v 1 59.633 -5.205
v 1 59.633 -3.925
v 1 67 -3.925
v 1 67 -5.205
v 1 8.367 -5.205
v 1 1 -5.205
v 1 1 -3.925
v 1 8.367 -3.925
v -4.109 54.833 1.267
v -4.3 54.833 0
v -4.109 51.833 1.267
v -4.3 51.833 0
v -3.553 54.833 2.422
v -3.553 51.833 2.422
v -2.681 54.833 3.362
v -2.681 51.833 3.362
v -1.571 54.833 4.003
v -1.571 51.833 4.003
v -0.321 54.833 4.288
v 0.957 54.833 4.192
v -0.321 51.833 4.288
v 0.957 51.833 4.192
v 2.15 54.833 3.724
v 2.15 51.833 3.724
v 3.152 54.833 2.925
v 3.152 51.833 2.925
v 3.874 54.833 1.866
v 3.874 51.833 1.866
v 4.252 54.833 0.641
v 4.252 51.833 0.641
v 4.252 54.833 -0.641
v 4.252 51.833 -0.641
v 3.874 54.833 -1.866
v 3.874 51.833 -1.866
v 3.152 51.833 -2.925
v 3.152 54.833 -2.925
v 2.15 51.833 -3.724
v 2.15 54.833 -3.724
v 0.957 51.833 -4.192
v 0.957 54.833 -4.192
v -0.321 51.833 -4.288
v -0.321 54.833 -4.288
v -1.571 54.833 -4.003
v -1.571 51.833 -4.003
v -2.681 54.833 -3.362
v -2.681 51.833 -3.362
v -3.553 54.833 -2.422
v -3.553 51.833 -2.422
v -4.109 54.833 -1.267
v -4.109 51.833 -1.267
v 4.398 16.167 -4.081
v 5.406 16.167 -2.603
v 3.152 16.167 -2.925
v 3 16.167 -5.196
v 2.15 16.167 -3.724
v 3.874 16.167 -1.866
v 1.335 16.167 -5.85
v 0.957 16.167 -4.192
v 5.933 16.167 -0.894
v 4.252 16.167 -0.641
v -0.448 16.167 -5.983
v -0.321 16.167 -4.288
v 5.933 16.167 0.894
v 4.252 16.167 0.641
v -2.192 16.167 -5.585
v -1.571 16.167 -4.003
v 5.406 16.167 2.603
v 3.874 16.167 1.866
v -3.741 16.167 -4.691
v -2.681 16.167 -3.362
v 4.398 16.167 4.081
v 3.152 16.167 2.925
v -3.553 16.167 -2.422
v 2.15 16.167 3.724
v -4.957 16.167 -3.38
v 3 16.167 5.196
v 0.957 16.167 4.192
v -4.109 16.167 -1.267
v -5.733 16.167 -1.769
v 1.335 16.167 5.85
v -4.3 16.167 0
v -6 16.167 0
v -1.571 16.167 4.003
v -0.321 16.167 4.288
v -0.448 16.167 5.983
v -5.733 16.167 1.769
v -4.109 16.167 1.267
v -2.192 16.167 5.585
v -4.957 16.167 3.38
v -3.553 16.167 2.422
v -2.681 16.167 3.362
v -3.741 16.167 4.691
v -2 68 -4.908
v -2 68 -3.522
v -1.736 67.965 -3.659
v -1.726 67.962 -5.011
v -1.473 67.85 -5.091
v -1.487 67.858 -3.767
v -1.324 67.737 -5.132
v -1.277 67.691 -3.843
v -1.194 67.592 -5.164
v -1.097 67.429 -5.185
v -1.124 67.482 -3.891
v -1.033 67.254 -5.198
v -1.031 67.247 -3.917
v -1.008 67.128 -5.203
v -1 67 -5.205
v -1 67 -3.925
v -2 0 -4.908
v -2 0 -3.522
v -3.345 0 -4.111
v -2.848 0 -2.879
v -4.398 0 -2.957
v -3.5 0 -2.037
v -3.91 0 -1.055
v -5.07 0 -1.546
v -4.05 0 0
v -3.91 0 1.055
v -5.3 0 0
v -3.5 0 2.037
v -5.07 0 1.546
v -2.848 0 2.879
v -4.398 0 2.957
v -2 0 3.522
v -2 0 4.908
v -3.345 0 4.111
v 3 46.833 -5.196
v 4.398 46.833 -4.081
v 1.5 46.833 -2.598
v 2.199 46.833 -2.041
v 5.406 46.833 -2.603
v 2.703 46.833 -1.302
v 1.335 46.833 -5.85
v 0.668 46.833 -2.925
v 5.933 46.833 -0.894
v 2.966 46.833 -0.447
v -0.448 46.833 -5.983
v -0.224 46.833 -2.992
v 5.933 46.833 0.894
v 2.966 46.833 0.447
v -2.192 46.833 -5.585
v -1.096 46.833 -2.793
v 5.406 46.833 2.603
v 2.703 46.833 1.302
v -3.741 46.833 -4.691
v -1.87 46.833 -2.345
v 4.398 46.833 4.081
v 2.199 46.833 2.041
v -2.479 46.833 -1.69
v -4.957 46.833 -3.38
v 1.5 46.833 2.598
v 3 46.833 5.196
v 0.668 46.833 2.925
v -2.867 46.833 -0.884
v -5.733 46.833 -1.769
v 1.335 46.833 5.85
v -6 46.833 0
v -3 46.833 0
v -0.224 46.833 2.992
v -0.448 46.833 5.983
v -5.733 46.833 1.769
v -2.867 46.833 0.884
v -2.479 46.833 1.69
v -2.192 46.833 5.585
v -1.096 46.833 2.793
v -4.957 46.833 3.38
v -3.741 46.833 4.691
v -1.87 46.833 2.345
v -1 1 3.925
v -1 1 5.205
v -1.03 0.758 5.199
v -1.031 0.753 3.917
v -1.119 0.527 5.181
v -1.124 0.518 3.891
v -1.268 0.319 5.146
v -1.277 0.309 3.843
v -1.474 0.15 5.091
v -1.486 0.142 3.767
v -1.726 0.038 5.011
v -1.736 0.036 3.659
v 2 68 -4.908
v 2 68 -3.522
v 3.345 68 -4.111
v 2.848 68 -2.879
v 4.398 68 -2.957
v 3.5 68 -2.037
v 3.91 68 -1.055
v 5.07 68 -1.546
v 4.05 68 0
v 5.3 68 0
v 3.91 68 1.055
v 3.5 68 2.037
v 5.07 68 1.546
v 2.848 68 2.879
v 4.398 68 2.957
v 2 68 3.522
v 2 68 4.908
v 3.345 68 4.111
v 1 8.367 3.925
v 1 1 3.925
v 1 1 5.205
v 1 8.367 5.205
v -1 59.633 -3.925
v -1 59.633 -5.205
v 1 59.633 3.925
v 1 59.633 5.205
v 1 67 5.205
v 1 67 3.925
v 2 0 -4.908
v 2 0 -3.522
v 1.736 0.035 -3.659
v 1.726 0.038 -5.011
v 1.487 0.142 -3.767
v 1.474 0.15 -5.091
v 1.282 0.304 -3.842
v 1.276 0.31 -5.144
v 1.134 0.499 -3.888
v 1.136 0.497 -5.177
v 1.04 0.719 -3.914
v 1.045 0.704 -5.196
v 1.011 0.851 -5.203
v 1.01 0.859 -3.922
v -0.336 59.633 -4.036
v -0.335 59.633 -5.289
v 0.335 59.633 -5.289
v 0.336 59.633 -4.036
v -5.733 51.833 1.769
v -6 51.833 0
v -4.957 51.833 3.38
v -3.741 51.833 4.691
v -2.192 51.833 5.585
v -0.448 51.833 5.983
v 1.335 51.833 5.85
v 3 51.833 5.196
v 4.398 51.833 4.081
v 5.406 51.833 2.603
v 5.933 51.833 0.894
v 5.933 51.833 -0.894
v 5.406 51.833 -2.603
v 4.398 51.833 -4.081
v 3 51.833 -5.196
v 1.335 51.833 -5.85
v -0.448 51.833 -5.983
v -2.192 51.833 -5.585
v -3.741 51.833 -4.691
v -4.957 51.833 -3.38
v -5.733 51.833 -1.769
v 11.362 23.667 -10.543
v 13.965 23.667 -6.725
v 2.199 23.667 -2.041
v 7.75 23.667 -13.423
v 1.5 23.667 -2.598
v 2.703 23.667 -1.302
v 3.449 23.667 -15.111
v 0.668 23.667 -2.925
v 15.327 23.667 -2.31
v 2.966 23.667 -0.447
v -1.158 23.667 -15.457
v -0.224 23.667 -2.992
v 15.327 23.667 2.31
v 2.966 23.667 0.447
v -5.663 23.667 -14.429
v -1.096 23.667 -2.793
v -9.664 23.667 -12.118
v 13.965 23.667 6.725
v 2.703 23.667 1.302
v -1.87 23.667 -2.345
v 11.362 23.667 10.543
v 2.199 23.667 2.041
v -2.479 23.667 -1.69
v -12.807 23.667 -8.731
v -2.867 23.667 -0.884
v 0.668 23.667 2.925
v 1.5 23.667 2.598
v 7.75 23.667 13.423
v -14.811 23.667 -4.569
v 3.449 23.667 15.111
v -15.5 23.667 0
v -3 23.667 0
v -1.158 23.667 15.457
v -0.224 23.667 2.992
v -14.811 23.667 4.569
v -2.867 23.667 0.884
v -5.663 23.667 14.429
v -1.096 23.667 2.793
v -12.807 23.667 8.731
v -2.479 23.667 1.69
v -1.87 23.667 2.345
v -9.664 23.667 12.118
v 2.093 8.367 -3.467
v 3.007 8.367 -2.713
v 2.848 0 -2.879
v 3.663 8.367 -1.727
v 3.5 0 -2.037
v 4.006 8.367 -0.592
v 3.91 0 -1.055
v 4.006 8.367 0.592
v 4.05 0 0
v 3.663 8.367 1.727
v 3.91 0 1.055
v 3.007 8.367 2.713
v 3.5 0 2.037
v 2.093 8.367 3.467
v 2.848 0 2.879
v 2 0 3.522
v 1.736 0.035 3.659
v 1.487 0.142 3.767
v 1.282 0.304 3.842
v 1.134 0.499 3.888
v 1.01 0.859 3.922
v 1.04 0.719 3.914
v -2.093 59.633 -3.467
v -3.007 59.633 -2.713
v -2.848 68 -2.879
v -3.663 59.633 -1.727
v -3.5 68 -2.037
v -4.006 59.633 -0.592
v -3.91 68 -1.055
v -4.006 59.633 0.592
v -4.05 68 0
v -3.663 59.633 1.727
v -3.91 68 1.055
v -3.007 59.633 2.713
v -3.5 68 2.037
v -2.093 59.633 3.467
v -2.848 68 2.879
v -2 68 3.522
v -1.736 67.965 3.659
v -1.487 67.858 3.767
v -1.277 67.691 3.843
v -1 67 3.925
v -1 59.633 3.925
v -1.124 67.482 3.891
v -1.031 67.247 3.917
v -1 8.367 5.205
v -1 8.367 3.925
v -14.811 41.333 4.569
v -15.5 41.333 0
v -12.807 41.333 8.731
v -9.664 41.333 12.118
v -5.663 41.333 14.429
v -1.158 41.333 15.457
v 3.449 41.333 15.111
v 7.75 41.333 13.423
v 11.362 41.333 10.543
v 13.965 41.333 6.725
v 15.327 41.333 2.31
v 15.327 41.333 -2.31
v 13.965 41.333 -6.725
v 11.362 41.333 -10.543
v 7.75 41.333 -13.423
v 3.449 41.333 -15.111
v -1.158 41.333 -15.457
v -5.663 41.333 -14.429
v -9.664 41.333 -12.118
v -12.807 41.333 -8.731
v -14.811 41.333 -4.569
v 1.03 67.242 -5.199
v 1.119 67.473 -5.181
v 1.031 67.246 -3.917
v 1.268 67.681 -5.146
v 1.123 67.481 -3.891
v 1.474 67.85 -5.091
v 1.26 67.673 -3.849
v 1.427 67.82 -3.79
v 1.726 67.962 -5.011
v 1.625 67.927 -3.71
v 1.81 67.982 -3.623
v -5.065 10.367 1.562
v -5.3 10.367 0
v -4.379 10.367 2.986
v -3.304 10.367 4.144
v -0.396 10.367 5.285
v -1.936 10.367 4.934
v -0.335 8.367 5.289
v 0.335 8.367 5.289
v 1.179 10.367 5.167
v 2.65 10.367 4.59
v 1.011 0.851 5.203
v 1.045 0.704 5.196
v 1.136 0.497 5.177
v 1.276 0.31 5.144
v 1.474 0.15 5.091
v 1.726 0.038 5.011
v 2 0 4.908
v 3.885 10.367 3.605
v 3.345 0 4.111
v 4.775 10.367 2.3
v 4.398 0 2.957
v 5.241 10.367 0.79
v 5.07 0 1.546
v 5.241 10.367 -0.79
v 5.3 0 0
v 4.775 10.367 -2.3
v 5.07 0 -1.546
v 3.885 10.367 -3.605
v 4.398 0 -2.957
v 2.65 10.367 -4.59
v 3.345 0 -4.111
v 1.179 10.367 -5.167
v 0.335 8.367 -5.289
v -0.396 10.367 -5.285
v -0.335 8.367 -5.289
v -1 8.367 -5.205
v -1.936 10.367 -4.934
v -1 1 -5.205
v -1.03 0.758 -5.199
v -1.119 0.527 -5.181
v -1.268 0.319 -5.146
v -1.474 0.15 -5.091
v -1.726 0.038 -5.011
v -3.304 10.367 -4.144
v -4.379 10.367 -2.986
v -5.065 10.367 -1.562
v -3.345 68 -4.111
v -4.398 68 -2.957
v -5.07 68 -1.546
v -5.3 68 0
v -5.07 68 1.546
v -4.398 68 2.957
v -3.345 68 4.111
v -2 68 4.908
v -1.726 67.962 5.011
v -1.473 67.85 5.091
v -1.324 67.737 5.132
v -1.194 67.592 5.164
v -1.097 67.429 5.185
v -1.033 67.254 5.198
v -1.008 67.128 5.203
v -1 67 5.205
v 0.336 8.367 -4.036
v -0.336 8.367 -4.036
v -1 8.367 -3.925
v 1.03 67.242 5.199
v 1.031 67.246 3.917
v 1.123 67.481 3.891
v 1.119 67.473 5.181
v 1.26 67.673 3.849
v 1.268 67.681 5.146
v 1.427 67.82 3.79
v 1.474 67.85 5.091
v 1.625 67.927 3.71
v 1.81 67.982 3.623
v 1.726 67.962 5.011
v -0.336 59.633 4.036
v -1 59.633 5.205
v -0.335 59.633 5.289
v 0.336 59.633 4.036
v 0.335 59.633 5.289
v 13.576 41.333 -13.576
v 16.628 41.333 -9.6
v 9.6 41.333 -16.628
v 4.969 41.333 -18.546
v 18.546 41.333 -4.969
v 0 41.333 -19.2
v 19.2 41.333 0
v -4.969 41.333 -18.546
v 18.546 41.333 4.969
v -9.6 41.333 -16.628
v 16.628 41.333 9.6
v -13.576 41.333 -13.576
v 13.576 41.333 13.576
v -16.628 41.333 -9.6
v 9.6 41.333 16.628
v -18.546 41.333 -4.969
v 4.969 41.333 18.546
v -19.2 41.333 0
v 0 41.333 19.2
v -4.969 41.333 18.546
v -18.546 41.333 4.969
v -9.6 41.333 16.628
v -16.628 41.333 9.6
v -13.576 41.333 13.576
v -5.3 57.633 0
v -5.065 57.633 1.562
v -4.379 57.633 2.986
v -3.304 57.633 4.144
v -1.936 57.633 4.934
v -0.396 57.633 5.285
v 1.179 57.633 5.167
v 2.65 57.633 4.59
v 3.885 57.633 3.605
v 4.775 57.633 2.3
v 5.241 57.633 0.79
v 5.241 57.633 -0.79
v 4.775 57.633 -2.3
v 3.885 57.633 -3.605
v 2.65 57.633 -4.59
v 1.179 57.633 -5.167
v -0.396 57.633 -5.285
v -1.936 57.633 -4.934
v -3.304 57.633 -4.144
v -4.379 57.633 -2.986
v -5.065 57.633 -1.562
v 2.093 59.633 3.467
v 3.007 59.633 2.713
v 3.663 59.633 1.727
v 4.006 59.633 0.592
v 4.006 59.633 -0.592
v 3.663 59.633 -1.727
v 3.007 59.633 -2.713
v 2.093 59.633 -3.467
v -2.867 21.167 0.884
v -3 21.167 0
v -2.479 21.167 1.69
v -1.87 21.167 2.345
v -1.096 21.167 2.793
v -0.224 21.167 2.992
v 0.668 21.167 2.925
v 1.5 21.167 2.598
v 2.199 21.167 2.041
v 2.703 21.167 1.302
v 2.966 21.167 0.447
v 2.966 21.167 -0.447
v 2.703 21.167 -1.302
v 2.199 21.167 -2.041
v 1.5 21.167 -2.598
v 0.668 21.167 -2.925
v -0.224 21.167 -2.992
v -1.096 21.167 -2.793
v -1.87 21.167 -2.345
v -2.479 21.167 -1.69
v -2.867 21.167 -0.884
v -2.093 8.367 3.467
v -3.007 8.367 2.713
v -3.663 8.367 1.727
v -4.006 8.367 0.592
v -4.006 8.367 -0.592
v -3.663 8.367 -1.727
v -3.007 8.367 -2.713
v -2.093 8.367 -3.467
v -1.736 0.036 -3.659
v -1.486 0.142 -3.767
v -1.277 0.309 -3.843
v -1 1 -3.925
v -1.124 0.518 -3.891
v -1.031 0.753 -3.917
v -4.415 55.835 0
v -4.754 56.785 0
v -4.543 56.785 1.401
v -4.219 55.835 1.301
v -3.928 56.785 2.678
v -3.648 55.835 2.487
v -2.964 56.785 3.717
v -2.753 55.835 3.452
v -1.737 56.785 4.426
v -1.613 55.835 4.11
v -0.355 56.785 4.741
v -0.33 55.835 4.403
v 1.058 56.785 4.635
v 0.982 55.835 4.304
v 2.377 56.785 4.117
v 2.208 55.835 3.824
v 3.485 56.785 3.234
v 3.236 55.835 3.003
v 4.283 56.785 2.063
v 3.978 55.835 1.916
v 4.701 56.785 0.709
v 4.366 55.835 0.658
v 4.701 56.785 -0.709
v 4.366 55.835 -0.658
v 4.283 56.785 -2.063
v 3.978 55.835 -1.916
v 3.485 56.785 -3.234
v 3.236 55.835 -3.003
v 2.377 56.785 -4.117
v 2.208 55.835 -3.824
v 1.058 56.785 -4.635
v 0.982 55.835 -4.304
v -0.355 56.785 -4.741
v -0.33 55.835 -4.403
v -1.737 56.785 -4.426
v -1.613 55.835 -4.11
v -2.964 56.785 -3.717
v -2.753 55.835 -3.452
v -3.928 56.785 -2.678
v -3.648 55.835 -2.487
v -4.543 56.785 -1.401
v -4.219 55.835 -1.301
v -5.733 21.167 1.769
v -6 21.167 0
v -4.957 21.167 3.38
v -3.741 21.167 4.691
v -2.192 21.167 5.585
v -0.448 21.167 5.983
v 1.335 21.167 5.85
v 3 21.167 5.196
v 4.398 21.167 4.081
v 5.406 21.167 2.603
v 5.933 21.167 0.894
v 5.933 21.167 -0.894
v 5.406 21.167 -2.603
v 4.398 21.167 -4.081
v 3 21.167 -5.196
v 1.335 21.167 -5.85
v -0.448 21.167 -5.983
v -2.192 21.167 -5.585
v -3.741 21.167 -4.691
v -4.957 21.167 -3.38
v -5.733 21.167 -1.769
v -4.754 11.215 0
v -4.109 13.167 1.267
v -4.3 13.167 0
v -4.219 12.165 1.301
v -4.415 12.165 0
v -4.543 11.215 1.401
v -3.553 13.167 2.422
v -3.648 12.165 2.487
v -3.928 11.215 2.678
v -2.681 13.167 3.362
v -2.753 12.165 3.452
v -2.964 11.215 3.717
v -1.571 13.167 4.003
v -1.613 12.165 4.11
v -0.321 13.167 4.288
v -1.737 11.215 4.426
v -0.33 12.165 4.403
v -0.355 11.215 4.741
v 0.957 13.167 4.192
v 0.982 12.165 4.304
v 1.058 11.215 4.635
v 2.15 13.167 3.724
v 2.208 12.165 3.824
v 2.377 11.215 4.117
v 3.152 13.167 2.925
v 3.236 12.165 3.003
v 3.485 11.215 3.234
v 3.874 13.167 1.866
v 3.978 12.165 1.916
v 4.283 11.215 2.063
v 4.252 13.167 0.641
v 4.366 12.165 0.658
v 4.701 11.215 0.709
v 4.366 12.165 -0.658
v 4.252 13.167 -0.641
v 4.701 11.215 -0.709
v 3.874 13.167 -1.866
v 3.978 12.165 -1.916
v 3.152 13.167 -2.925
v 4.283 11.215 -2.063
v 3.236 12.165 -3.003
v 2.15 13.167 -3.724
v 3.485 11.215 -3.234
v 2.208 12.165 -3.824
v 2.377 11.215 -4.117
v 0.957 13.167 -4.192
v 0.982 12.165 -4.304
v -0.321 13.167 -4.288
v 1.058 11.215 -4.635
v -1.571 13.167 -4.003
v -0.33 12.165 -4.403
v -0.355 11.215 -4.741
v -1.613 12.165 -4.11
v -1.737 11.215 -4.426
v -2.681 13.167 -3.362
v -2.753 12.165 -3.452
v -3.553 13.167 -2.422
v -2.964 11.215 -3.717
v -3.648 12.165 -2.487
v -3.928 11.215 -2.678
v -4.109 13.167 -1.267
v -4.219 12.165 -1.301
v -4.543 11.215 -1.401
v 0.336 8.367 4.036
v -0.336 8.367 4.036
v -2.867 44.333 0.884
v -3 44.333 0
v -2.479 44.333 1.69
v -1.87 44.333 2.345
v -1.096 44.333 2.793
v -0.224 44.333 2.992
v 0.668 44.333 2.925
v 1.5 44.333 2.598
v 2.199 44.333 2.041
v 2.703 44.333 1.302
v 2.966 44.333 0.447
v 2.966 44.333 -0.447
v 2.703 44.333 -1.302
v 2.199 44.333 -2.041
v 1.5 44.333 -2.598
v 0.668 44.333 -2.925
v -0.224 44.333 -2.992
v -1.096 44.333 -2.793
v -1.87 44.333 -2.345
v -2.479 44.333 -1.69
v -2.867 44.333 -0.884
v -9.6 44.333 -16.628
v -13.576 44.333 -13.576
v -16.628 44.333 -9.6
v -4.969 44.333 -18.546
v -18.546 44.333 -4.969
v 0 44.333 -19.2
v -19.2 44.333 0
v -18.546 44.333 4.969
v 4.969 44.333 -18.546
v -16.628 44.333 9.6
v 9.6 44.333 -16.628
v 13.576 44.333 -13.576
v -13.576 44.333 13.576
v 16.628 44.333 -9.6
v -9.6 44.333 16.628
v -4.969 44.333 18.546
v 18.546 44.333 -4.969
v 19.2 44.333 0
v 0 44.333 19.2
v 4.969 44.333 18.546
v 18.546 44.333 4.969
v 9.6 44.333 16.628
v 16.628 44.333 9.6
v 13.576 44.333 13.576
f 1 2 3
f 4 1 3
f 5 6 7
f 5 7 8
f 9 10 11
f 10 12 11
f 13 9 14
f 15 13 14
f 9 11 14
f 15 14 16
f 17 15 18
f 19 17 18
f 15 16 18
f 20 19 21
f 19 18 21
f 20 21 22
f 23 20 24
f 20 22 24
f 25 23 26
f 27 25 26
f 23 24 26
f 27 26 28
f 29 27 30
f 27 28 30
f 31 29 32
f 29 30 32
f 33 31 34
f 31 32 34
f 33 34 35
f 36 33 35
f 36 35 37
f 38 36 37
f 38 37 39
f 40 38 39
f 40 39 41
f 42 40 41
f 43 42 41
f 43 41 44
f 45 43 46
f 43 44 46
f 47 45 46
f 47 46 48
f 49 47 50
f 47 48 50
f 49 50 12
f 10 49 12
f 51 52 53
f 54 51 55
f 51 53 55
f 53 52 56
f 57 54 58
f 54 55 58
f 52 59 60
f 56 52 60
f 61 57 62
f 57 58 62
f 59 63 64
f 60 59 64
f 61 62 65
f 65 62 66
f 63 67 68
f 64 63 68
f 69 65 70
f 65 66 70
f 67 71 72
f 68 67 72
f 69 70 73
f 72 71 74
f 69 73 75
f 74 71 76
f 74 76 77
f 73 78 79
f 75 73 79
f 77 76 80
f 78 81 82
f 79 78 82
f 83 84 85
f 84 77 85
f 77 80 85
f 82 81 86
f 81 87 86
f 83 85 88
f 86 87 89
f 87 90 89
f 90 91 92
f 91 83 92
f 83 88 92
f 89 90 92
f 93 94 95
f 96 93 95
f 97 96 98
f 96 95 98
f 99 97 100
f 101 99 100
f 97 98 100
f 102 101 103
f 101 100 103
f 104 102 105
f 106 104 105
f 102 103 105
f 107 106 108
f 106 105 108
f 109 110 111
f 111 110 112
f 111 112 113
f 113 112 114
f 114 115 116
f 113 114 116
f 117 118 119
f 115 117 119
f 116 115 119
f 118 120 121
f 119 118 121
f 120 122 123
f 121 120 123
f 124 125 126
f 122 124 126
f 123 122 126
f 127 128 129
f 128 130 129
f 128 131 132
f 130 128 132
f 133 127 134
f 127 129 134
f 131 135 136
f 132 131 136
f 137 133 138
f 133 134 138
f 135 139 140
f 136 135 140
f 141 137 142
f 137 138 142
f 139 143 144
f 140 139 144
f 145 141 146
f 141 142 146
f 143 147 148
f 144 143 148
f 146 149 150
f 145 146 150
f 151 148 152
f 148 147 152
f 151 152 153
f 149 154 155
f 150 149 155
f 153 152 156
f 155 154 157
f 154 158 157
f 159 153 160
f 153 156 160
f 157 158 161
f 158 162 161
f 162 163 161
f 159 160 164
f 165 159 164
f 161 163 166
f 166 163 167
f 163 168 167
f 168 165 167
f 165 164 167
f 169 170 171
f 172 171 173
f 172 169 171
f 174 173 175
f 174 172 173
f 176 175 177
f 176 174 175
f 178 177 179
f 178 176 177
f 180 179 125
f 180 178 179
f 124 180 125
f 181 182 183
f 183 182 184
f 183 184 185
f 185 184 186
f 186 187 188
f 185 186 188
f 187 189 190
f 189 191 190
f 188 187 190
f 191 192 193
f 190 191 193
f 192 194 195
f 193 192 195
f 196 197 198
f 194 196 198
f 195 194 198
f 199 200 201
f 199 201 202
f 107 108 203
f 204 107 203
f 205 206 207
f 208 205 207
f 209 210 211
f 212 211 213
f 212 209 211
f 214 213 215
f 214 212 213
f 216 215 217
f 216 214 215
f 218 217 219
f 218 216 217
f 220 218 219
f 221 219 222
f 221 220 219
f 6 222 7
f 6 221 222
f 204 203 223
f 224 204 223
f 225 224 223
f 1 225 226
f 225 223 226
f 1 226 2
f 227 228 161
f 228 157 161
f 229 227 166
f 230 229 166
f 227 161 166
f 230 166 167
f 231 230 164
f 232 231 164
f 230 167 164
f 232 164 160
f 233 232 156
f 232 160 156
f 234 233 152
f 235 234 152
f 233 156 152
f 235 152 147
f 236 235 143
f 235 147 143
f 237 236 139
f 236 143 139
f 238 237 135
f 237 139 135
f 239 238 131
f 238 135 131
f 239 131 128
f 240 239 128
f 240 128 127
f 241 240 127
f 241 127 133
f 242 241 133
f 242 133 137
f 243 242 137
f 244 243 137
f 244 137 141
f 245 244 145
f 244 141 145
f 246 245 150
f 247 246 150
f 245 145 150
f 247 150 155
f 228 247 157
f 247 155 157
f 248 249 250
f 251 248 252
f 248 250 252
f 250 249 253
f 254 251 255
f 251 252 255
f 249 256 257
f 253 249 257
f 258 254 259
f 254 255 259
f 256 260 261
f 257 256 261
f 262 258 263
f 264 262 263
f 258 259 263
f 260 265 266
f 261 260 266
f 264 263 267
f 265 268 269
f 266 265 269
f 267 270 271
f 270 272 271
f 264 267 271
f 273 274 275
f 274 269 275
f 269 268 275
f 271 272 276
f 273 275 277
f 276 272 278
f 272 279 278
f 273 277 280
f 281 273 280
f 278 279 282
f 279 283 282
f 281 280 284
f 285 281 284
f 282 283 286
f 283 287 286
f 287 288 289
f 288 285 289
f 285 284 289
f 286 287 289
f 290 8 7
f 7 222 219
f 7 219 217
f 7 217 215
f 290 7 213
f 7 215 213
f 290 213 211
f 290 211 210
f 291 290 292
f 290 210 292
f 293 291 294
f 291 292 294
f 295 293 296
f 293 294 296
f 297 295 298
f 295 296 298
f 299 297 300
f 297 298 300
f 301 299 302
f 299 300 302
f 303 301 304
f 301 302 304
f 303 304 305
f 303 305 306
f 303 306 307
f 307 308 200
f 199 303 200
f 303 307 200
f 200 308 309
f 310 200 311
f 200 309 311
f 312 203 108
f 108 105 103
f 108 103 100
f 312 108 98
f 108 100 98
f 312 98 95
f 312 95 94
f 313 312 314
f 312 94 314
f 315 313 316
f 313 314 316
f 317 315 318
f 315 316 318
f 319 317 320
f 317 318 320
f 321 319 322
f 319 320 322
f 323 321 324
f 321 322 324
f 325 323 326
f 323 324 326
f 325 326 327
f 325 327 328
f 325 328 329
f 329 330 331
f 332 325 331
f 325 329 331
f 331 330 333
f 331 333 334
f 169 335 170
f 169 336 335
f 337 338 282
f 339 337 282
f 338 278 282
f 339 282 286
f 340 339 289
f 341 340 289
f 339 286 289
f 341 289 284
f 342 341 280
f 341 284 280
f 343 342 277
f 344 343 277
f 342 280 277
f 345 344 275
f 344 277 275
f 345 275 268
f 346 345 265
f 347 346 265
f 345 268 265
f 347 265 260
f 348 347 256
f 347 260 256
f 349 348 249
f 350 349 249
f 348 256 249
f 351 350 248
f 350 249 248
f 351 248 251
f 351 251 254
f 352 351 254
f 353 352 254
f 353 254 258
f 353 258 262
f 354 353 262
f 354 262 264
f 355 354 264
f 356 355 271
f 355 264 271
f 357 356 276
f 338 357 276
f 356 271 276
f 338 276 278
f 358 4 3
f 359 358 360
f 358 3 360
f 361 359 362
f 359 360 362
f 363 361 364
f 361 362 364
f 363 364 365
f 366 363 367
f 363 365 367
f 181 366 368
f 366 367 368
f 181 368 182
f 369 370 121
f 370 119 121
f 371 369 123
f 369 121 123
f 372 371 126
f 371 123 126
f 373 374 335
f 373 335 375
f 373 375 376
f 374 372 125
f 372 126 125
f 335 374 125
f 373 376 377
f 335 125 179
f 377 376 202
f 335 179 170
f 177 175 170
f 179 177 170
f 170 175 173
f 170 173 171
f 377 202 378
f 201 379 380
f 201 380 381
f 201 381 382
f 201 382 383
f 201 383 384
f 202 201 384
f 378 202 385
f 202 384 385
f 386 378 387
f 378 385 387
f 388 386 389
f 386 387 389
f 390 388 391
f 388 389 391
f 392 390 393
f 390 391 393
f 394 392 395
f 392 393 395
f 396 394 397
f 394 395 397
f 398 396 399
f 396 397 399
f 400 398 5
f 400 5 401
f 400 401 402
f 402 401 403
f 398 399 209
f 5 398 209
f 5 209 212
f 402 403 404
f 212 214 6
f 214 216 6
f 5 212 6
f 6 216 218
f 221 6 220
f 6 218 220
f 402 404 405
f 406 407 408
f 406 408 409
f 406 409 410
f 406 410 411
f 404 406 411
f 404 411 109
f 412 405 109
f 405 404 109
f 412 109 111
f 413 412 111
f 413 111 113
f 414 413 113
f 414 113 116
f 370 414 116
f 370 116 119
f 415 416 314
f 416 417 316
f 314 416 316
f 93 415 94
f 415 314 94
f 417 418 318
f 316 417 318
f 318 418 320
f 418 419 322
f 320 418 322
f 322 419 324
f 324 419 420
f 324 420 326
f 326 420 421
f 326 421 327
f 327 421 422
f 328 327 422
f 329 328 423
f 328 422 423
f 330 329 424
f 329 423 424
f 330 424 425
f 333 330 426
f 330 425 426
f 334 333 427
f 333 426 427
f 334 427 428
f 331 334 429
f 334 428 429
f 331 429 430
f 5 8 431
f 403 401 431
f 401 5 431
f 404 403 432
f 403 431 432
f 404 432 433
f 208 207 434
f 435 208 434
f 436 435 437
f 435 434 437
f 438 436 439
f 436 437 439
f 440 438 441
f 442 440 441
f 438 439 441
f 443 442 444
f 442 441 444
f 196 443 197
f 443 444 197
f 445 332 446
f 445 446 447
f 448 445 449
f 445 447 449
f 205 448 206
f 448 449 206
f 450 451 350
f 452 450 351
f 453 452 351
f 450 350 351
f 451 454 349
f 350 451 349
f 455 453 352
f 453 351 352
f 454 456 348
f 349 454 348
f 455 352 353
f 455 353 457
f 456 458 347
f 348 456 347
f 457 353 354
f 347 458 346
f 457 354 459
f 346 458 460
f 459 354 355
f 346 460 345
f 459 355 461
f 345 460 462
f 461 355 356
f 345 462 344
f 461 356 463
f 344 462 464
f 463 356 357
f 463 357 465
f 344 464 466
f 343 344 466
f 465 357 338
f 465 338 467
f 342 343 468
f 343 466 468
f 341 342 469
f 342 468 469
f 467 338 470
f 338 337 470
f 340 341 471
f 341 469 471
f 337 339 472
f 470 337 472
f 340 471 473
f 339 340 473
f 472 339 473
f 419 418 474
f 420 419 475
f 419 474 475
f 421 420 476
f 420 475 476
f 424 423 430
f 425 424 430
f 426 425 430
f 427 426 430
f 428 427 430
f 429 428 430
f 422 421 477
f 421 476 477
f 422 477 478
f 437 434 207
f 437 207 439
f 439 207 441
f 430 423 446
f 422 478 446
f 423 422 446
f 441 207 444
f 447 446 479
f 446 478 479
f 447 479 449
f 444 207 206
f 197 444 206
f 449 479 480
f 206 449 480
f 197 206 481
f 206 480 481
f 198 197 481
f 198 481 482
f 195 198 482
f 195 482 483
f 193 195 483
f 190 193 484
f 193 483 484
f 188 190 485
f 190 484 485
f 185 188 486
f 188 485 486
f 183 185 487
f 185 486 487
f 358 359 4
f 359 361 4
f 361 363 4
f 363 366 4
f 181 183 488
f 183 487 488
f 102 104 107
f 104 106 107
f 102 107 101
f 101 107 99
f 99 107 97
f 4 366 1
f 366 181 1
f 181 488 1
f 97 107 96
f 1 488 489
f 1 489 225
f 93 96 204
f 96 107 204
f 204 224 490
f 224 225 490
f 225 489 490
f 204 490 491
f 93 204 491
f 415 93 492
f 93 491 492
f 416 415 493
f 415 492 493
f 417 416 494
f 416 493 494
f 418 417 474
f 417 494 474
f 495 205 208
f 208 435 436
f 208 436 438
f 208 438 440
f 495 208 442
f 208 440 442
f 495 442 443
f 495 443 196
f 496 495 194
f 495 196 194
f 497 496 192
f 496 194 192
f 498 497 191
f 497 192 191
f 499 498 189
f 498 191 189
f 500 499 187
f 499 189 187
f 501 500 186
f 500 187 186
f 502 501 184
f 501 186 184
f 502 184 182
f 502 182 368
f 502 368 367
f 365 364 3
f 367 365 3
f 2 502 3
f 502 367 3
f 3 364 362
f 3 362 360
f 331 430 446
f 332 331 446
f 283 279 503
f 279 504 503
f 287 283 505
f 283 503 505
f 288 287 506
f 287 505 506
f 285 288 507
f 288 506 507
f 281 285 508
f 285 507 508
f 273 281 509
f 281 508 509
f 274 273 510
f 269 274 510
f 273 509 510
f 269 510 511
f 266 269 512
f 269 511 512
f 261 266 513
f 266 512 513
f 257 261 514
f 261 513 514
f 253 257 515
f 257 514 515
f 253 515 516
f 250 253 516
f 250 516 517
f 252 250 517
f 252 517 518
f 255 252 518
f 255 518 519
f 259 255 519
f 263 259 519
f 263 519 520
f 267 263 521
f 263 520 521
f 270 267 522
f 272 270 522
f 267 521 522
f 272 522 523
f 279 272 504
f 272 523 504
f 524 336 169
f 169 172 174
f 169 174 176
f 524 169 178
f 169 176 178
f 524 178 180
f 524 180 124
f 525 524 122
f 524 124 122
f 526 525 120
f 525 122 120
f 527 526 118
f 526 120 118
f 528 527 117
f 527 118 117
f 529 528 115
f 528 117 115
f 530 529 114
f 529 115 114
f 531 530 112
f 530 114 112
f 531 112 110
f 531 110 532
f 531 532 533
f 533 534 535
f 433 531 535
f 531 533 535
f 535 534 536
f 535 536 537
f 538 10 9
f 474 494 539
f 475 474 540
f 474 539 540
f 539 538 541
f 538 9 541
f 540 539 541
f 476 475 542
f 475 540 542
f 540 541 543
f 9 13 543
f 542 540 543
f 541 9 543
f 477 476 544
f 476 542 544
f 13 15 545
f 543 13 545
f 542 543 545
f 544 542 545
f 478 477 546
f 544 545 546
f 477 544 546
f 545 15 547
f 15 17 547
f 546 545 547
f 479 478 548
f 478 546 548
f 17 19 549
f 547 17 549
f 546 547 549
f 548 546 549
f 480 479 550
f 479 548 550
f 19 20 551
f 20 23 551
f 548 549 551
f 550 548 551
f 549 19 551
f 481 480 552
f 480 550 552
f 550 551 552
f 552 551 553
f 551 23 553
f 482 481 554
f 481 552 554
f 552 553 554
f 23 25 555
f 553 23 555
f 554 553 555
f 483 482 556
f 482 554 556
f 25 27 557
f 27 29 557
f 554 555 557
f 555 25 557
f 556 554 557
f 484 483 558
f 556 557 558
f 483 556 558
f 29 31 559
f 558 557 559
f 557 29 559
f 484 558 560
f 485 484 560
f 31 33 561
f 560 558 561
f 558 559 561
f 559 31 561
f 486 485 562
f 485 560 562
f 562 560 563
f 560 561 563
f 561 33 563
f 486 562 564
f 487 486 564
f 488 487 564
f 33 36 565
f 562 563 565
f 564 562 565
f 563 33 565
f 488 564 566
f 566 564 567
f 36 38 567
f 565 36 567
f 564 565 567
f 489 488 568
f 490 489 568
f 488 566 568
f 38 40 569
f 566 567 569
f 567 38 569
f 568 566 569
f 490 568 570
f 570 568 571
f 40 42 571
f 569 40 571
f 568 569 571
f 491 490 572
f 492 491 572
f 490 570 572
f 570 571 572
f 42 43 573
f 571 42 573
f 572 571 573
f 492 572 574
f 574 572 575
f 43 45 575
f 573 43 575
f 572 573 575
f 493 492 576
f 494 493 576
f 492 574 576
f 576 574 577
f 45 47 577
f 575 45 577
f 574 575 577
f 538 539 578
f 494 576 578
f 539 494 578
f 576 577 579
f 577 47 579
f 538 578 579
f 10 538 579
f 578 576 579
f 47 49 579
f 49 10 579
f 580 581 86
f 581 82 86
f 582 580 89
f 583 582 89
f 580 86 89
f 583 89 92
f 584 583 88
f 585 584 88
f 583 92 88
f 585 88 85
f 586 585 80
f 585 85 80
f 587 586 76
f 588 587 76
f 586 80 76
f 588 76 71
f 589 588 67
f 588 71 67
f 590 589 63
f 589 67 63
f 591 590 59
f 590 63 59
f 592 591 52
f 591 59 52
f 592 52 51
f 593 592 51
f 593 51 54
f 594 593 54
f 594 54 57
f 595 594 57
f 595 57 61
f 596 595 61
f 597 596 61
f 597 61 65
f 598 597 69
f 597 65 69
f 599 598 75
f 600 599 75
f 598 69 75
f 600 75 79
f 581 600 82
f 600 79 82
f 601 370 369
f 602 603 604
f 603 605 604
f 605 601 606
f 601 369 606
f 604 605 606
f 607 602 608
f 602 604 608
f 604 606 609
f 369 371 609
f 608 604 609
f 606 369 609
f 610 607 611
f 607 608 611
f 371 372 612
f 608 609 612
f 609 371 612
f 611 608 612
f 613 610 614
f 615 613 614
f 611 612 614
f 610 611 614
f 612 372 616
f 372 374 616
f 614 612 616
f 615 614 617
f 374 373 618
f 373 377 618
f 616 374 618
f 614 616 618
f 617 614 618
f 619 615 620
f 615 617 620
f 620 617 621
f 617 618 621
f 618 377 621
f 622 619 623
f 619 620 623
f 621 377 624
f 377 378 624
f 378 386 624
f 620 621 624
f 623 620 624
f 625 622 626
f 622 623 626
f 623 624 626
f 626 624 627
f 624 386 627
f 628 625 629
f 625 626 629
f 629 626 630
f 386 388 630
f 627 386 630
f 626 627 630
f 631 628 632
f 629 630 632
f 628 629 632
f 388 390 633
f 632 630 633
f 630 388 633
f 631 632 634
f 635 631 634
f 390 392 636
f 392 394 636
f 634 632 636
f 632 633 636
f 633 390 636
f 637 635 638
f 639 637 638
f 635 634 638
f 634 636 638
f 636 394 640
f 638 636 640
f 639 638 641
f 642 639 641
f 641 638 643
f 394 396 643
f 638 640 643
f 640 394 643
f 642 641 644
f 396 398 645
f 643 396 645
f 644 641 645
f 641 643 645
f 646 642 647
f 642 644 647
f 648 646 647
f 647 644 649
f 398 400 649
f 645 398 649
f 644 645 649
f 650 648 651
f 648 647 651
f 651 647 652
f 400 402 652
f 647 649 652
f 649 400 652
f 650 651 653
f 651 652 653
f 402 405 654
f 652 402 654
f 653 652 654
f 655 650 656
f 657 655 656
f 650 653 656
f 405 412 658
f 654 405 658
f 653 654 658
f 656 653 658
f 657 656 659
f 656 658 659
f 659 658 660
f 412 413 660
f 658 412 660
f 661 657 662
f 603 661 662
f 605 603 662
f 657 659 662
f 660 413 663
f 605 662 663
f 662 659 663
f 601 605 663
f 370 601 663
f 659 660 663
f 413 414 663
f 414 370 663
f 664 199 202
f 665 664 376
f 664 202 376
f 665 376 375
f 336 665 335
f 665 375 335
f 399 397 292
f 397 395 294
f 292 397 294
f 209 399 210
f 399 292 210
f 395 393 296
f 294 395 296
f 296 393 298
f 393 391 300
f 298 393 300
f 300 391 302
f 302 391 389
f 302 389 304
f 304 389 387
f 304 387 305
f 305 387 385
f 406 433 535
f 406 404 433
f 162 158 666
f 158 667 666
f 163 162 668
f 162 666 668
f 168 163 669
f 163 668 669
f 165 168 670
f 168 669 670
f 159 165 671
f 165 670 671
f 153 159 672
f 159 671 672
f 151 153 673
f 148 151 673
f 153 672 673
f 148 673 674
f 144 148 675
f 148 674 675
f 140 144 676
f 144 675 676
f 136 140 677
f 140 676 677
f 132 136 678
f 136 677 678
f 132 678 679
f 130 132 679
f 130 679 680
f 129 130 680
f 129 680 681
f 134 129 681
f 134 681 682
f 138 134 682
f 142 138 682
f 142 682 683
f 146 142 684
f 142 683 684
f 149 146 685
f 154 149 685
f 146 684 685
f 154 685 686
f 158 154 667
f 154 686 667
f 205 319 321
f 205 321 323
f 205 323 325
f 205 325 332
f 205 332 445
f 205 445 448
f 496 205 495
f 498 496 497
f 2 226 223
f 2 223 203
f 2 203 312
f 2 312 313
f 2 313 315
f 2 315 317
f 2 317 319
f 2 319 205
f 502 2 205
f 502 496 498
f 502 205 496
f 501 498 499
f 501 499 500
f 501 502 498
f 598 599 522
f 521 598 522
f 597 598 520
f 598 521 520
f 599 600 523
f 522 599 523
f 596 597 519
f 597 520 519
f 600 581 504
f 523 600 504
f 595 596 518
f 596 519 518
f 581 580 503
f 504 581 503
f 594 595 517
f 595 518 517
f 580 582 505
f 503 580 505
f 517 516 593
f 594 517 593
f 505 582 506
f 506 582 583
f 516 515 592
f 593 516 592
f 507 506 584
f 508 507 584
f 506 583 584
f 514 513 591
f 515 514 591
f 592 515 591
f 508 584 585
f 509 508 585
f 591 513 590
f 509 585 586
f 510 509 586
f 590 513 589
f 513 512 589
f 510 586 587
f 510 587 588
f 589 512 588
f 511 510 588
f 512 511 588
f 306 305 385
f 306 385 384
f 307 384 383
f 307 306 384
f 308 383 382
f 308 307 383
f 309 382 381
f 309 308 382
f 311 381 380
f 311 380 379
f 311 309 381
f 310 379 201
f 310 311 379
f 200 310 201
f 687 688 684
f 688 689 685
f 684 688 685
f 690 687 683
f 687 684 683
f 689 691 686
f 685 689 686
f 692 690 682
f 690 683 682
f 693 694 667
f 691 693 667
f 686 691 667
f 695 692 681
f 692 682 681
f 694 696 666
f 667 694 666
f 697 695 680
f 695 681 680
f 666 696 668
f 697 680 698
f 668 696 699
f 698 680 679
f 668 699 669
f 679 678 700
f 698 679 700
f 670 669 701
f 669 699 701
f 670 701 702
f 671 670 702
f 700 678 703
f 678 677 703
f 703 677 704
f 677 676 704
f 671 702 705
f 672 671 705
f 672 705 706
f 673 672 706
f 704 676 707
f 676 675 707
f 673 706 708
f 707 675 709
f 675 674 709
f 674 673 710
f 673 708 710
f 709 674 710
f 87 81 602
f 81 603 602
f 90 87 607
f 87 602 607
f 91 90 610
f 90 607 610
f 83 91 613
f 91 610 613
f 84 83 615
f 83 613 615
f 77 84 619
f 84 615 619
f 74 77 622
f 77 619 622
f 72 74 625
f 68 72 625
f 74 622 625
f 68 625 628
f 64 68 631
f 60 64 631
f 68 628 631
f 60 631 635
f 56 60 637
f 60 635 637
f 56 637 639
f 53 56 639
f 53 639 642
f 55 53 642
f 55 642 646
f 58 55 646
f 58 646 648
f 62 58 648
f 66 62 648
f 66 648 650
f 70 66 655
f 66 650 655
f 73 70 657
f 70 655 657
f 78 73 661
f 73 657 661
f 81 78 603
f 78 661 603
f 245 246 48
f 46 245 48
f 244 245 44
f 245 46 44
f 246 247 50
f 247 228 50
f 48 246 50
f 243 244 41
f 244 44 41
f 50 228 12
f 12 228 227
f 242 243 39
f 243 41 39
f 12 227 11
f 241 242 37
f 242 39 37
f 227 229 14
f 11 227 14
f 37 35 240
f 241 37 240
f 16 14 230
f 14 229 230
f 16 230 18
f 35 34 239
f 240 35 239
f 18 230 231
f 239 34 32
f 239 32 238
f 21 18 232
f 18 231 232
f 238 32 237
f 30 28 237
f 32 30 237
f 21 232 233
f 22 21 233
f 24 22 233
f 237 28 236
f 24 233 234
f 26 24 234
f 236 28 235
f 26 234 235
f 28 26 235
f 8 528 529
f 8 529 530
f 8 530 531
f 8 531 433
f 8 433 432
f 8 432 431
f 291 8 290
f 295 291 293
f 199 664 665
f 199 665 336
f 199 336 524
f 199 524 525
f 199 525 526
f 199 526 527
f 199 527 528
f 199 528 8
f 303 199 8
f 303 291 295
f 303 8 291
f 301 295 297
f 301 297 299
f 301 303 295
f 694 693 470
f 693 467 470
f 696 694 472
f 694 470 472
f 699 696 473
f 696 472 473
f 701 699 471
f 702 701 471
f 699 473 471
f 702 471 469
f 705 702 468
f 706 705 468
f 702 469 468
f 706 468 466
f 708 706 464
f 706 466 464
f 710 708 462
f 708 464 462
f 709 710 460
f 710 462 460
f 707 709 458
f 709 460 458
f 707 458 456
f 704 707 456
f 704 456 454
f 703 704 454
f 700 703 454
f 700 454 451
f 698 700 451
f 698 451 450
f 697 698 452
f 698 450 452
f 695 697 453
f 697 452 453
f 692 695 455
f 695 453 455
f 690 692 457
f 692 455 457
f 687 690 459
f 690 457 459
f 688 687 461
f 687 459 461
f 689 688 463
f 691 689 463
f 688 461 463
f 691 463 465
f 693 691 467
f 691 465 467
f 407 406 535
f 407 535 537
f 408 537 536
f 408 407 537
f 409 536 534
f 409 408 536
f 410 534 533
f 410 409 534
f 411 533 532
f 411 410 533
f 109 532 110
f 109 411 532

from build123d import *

# Parameters (mm, degrees)
CUT_EXTRUDE1_DEPTH      = 20.2
CUT_EXTRUDE1_DEPTH_BACK = 20.2
SKETCH3_R               = 4.05
CUT_EXTRUDE2_DEPTH      = 8.366667
SKETCH4_R               = 4.05
CUT_EXTRUDE3_DEPTH      = 8.366667


with BuildPart() as part:
    # Sketch1 → Revolve1 (revolve)
    with BuildSketch(Plane.XY):
        with BuildLine():
            Line((-1, 8.366666667), (0, 8.366666667))
            Line((0, 8.366666667), (0, 59.633333333))
            Line((0, 59.633333333), (-1, 59.633333333))
            Line((-1, 59.633333333), (-1, 67))
            ThreePointArc((-1, 67), (-1.292893219, 67.707106781), (-2, 68))
            Line((-2, 68), (-5.3, 68))
            Line((-5.3, 68), (-5.3, 57.633333333))
            ThreePointArc((-5.3, 57.633333333), (-4.557500751, 56.319940208), (-4.3, 54.833333333))
            Line((-4.3, 54.833333333), (-4.3, 51.833333333))
            Line((-4.3, 51.833333333), (-6, 51.833333333))
            Line((-6, 51.833333333), (-6, 46.833333333))
            Line((-6, 46.833333333), (-3, 46.833333333))
            Line((-3, 46.833333333), (-3, 44.333333333))
            Line((-3, 44.333333333), (-19.2, 44.333333333))
            Line((-19.2, 44.333333333), (-19.2, 41.333333333))
            Line((-19.2, 41.333333333), (-15.5, 41.333333333))
            Line((-15.5, 41.333333333), (-15.5, 23.666666667))
            Line((-15.5, 23.666666667), (-3, 23.666666667))
            Line((-3, 23.666666667), (-3, 21.166666667))
            Line((-3, 21.166666667), (-6, 21.166666667))
            Line((-6, 21.166666667), (-6, 16.166666667))
            Line((-6, 16.166666667), (-4.3, 16.166666667))
            Line((-4.3, 16.166666667), (-4.3, 13.166666667))
            ThreePointArc((-4.3, 13.166666667), (-4.557500751, 11.680059792), (-5.3, 10.366666667))
            Line((-5.3, 10.366666667), (-5.3, 0))
            Line((-5.3, 0), (-2, 0))
            ThreePointArc((-2, 0), (-1.292893219, 0.292893219), (-1, 1))
            Line((-1, 1), (-1, 8.366666667))
        make_face()
    revolve(axis=Axis((0, 0, 0), (0, 1, 0)))

    # Sketch2 → Cut-Extrude1 (cut, two sides)
    with BuildSketch(Plane.XY) as cut_extrude1_sk:
        with BuildLine():
            Line((1, 8.366666667), (0, 8.366666667))
            Line((0, 8.366666667), (0, 0))
            Line((0, 0), (2, 0))
            ThreePointArc((2, 0), (1.292893219, 0.292893219), (1, 1))
            Line((1, 1), (1, 8.366666667))
        make_face()
        with BuildLine():
            Line((-1, 8.366666667), (-1, 1))
            ThreePointArc((-1, 1), (-1.292893219, 0.292893219), (-2, 0))
            Line((-2, 0), (0, 0))
            Line((0, 0), (0, 8.366666667))
            Line((0, 8.366666667), (-1, 8.366666667))
        make_face()
        with BuildLine():
            Line((-1, 67), (-1, 59.633333333))
            Line((-1, 59.633333333), (1, 59.633333333))
            Line((1, 59.633333333), (1, 67))
            ThreePointArc((1, 67), (1.292893219, 67.707106781), (2, 68))
            Line((2, 68), (-2, 68))
            ThreePointArc((-2, 68), (-1.292893219, 67.707106781), (-1, 67))
        make_face()
    extrude(amount=CUT_EXTRUDE1_DEPTH, mode=Mode.SUBTRACT)
    extrude(cut_extrude1_sk.sketch, amount=-CUT_EXTRUDE1_DEPTH_BACK, mode=Mode.SUBTRACT)

    # Sketch3 → Cut-Extrude2 (cut)
    with BuildSketch(Plane(origin=(0, 68, 0), x_dir=(1, 0, 0), z_dir=(0, 1, 0))):
        Circle(SKETCH3_R)
    extrude(amount=-CUT_EXTRUDE2_DEPTH, mode=Mode.SUBTRACT)

    # Sketch4 → Cut-Extrude3 (cut)
    with BuildSketch(Plane.XZ):
        Circle(SKETCH4_R)
    extrude(amount=-CUT_EXTRUDE3_DEPTH, mode=Mode.SUBTRACT)


solid = part.part
